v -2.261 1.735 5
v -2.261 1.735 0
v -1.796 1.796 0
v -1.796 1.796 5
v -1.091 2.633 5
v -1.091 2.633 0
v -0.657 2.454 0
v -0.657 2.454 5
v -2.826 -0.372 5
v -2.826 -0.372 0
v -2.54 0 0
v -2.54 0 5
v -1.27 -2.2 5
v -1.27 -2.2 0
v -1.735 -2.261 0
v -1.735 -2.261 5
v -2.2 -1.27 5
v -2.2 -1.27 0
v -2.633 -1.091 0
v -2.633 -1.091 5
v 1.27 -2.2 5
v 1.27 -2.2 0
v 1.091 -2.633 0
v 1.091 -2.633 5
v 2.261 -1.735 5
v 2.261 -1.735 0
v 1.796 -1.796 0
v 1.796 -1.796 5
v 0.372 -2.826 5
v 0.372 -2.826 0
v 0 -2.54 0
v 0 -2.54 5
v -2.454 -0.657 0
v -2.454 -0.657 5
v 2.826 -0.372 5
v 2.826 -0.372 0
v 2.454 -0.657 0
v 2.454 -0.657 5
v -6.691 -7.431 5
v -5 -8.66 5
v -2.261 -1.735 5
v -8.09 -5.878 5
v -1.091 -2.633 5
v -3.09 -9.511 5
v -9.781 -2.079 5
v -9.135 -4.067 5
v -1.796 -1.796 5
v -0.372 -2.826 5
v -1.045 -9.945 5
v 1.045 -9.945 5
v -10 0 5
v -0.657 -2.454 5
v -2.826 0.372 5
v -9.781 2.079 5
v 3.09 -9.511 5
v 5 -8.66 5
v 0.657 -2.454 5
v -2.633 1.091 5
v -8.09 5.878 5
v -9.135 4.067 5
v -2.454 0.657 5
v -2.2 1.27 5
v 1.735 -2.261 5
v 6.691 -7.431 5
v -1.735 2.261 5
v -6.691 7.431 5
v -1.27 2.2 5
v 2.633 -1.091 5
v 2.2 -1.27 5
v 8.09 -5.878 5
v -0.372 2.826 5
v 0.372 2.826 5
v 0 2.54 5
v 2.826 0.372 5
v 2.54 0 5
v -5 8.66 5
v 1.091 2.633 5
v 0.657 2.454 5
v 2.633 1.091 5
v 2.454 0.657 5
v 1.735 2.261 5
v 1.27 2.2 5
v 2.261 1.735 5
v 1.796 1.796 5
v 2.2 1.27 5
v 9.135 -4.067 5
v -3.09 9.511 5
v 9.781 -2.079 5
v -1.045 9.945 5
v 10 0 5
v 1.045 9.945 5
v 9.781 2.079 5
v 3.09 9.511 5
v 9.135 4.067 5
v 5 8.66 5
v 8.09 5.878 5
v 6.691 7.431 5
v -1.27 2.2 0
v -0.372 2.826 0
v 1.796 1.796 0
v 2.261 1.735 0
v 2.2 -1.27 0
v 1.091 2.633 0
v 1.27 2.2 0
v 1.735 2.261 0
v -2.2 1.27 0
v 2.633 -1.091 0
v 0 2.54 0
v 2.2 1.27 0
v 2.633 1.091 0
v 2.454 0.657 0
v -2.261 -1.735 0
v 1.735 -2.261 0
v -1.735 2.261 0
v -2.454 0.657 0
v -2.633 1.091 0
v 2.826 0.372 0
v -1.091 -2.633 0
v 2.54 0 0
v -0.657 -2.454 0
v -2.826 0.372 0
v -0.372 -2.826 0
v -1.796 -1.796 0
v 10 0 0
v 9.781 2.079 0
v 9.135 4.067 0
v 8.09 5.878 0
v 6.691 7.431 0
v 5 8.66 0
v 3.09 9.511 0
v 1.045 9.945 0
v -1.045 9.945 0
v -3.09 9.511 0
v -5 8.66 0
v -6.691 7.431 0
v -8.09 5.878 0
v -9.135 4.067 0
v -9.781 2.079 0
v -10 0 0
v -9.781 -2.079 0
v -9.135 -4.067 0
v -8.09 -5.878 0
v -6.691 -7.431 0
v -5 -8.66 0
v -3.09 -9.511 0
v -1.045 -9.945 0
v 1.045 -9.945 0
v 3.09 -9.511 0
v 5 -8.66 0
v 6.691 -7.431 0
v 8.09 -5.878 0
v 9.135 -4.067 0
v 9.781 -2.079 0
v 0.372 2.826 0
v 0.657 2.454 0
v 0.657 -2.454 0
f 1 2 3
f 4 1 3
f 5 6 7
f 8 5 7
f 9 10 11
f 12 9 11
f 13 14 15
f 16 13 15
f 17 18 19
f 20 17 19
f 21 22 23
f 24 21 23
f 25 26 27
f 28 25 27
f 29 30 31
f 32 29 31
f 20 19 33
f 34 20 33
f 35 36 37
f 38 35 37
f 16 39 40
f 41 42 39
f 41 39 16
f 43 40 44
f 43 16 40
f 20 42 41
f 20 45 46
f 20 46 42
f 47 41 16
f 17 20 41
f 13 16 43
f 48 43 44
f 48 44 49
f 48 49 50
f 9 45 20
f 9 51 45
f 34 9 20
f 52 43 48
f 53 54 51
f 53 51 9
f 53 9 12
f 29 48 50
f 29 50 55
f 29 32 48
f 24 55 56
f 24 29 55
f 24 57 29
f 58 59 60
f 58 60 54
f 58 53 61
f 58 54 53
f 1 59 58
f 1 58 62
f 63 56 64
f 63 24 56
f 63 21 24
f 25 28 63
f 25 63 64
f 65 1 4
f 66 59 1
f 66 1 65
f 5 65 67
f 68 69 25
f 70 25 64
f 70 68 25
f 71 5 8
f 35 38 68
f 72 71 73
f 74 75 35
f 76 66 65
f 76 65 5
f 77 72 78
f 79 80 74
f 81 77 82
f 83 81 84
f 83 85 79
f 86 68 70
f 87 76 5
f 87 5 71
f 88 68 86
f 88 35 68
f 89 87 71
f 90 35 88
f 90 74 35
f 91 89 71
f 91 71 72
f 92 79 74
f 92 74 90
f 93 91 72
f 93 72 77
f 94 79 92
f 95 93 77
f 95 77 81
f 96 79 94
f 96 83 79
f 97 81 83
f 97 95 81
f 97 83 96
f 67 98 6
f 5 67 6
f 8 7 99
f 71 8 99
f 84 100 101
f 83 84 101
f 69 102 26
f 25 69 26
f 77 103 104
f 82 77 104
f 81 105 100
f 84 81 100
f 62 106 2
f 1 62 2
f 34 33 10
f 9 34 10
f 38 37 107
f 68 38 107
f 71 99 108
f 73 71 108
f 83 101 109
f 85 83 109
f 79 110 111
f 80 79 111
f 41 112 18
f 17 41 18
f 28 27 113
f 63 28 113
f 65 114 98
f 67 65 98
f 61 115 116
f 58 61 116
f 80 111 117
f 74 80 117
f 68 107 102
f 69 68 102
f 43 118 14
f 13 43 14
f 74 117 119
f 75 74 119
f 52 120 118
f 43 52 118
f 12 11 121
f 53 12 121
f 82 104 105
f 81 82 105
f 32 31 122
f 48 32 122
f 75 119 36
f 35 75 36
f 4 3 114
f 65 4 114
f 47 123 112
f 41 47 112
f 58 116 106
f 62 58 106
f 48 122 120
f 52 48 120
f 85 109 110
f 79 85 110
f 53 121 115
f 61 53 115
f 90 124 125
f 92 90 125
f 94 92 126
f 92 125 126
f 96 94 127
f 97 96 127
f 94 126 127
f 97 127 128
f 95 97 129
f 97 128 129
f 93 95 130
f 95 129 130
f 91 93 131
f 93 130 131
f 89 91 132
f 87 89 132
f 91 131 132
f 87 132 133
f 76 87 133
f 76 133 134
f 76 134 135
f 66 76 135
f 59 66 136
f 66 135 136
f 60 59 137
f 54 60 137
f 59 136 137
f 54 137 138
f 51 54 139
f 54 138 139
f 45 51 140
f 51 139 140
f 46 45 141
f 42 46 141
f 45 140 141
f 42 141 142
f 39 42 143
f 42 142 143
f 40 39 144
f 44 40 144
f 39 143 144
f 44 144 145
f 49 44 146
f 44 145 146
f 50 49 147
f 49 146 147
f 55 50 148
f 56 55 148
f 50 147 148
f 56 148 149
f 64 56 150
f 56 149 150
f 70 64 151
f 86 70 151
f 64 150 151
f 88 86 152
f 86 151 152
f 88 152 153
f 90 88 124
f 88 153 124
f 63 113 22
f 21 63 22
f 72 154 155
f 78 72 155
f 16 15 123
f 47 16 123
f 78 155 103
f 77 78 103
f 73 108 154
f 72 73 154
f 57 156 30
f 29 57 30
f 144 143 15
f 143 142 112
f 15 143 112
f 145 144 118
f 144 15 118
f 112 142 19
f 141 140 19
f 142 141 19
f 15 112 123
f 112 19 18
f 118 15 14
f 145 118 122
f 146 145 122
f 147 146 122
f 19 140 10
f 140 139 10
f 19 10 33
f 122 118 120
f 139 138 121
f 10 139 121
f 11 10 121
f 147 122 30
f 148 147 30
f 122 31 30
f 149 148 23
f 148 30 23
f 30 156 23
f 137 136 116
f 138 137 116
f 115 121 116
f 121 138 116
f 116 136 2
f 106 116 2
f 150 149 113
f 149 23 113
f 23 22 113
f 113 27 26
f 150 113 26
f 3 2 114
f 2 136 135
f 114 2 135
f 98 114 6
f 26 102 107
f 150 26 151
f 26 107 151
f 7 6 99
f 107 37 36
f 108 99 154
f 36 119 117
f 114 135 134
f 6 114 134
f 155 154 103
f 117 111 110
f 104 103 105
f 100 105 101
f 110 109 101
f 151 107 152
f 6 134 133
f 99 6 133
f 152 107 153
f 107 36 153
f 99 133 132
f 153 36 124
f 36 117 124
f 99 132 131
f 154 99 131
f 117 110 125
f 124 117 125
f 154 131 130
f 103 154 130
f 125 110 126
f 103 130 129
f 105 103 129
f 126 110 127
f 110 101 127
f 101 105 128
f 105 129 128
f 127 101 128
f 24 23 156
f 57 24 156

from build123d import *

# Parameters (mm, degrees)
F0_R     = 10
F1_DEPTH = 5


with BuildPart() as f1:
    # F0 (on Top) → F1 (new body)
    with BuildSketch(Plane.XY):
        Circle(F0_R)
        Polygon((-0.372, 2.825618), (0, 2.540172), (0.372, 2.825618), (0.657445, 2.453618), (1.090648, 2.633057), (1.270086, 2.199854), (1.73497, 2.261057), (1.796173, 1.796173), (2.261057, 1.73497), (2.199854, 1.270086), (2.633057, 1.090648), (2.453618, 0.657445), (2.825618, 0.372), (2.540172, 0), (2.825618, -0.372), (2.453618, -0.657445), (2.633057, -1.090648), (2.199854, -1.270086), (2.261057, -1.73497), (1.796173, -1.796173), (1.73497, -2.261057), (1.270086, -2.199854), (1.090648, -2.633057), (0.657445, -2.453618), (0.372, -2.825618), (0, -2.540172), (-0.372, -2.825618), (-0.657445, -2.453618), (-1.090648, -2.633057), (-1.270086, -2.199854), (-1.73497, -2.261057), (-1.796173, -1.796173), (-2.261057, -1.73497), (-2.199854, -1.270086), (-2.633057, -1.090648), (-2.453618, -0.657445), (-2.825618, -0.372), (-2.540172, 0), (-2.825618, 0.372), (-2.453618, 0.657445), (-2.633057, 1.090648), (-2.199854, 1.270086), (-2.261057, 1.73497), (-1.796173, 1.796173), (-1.73497, 2.261057), (-1.270086, 2.199854), (-1.090648, 2.633057), (-0.657445, 2.453618), align=None, mode=Mode.SUBTRACT)
    extrude(amount=F1_DEPTH)


solid = f1.part
